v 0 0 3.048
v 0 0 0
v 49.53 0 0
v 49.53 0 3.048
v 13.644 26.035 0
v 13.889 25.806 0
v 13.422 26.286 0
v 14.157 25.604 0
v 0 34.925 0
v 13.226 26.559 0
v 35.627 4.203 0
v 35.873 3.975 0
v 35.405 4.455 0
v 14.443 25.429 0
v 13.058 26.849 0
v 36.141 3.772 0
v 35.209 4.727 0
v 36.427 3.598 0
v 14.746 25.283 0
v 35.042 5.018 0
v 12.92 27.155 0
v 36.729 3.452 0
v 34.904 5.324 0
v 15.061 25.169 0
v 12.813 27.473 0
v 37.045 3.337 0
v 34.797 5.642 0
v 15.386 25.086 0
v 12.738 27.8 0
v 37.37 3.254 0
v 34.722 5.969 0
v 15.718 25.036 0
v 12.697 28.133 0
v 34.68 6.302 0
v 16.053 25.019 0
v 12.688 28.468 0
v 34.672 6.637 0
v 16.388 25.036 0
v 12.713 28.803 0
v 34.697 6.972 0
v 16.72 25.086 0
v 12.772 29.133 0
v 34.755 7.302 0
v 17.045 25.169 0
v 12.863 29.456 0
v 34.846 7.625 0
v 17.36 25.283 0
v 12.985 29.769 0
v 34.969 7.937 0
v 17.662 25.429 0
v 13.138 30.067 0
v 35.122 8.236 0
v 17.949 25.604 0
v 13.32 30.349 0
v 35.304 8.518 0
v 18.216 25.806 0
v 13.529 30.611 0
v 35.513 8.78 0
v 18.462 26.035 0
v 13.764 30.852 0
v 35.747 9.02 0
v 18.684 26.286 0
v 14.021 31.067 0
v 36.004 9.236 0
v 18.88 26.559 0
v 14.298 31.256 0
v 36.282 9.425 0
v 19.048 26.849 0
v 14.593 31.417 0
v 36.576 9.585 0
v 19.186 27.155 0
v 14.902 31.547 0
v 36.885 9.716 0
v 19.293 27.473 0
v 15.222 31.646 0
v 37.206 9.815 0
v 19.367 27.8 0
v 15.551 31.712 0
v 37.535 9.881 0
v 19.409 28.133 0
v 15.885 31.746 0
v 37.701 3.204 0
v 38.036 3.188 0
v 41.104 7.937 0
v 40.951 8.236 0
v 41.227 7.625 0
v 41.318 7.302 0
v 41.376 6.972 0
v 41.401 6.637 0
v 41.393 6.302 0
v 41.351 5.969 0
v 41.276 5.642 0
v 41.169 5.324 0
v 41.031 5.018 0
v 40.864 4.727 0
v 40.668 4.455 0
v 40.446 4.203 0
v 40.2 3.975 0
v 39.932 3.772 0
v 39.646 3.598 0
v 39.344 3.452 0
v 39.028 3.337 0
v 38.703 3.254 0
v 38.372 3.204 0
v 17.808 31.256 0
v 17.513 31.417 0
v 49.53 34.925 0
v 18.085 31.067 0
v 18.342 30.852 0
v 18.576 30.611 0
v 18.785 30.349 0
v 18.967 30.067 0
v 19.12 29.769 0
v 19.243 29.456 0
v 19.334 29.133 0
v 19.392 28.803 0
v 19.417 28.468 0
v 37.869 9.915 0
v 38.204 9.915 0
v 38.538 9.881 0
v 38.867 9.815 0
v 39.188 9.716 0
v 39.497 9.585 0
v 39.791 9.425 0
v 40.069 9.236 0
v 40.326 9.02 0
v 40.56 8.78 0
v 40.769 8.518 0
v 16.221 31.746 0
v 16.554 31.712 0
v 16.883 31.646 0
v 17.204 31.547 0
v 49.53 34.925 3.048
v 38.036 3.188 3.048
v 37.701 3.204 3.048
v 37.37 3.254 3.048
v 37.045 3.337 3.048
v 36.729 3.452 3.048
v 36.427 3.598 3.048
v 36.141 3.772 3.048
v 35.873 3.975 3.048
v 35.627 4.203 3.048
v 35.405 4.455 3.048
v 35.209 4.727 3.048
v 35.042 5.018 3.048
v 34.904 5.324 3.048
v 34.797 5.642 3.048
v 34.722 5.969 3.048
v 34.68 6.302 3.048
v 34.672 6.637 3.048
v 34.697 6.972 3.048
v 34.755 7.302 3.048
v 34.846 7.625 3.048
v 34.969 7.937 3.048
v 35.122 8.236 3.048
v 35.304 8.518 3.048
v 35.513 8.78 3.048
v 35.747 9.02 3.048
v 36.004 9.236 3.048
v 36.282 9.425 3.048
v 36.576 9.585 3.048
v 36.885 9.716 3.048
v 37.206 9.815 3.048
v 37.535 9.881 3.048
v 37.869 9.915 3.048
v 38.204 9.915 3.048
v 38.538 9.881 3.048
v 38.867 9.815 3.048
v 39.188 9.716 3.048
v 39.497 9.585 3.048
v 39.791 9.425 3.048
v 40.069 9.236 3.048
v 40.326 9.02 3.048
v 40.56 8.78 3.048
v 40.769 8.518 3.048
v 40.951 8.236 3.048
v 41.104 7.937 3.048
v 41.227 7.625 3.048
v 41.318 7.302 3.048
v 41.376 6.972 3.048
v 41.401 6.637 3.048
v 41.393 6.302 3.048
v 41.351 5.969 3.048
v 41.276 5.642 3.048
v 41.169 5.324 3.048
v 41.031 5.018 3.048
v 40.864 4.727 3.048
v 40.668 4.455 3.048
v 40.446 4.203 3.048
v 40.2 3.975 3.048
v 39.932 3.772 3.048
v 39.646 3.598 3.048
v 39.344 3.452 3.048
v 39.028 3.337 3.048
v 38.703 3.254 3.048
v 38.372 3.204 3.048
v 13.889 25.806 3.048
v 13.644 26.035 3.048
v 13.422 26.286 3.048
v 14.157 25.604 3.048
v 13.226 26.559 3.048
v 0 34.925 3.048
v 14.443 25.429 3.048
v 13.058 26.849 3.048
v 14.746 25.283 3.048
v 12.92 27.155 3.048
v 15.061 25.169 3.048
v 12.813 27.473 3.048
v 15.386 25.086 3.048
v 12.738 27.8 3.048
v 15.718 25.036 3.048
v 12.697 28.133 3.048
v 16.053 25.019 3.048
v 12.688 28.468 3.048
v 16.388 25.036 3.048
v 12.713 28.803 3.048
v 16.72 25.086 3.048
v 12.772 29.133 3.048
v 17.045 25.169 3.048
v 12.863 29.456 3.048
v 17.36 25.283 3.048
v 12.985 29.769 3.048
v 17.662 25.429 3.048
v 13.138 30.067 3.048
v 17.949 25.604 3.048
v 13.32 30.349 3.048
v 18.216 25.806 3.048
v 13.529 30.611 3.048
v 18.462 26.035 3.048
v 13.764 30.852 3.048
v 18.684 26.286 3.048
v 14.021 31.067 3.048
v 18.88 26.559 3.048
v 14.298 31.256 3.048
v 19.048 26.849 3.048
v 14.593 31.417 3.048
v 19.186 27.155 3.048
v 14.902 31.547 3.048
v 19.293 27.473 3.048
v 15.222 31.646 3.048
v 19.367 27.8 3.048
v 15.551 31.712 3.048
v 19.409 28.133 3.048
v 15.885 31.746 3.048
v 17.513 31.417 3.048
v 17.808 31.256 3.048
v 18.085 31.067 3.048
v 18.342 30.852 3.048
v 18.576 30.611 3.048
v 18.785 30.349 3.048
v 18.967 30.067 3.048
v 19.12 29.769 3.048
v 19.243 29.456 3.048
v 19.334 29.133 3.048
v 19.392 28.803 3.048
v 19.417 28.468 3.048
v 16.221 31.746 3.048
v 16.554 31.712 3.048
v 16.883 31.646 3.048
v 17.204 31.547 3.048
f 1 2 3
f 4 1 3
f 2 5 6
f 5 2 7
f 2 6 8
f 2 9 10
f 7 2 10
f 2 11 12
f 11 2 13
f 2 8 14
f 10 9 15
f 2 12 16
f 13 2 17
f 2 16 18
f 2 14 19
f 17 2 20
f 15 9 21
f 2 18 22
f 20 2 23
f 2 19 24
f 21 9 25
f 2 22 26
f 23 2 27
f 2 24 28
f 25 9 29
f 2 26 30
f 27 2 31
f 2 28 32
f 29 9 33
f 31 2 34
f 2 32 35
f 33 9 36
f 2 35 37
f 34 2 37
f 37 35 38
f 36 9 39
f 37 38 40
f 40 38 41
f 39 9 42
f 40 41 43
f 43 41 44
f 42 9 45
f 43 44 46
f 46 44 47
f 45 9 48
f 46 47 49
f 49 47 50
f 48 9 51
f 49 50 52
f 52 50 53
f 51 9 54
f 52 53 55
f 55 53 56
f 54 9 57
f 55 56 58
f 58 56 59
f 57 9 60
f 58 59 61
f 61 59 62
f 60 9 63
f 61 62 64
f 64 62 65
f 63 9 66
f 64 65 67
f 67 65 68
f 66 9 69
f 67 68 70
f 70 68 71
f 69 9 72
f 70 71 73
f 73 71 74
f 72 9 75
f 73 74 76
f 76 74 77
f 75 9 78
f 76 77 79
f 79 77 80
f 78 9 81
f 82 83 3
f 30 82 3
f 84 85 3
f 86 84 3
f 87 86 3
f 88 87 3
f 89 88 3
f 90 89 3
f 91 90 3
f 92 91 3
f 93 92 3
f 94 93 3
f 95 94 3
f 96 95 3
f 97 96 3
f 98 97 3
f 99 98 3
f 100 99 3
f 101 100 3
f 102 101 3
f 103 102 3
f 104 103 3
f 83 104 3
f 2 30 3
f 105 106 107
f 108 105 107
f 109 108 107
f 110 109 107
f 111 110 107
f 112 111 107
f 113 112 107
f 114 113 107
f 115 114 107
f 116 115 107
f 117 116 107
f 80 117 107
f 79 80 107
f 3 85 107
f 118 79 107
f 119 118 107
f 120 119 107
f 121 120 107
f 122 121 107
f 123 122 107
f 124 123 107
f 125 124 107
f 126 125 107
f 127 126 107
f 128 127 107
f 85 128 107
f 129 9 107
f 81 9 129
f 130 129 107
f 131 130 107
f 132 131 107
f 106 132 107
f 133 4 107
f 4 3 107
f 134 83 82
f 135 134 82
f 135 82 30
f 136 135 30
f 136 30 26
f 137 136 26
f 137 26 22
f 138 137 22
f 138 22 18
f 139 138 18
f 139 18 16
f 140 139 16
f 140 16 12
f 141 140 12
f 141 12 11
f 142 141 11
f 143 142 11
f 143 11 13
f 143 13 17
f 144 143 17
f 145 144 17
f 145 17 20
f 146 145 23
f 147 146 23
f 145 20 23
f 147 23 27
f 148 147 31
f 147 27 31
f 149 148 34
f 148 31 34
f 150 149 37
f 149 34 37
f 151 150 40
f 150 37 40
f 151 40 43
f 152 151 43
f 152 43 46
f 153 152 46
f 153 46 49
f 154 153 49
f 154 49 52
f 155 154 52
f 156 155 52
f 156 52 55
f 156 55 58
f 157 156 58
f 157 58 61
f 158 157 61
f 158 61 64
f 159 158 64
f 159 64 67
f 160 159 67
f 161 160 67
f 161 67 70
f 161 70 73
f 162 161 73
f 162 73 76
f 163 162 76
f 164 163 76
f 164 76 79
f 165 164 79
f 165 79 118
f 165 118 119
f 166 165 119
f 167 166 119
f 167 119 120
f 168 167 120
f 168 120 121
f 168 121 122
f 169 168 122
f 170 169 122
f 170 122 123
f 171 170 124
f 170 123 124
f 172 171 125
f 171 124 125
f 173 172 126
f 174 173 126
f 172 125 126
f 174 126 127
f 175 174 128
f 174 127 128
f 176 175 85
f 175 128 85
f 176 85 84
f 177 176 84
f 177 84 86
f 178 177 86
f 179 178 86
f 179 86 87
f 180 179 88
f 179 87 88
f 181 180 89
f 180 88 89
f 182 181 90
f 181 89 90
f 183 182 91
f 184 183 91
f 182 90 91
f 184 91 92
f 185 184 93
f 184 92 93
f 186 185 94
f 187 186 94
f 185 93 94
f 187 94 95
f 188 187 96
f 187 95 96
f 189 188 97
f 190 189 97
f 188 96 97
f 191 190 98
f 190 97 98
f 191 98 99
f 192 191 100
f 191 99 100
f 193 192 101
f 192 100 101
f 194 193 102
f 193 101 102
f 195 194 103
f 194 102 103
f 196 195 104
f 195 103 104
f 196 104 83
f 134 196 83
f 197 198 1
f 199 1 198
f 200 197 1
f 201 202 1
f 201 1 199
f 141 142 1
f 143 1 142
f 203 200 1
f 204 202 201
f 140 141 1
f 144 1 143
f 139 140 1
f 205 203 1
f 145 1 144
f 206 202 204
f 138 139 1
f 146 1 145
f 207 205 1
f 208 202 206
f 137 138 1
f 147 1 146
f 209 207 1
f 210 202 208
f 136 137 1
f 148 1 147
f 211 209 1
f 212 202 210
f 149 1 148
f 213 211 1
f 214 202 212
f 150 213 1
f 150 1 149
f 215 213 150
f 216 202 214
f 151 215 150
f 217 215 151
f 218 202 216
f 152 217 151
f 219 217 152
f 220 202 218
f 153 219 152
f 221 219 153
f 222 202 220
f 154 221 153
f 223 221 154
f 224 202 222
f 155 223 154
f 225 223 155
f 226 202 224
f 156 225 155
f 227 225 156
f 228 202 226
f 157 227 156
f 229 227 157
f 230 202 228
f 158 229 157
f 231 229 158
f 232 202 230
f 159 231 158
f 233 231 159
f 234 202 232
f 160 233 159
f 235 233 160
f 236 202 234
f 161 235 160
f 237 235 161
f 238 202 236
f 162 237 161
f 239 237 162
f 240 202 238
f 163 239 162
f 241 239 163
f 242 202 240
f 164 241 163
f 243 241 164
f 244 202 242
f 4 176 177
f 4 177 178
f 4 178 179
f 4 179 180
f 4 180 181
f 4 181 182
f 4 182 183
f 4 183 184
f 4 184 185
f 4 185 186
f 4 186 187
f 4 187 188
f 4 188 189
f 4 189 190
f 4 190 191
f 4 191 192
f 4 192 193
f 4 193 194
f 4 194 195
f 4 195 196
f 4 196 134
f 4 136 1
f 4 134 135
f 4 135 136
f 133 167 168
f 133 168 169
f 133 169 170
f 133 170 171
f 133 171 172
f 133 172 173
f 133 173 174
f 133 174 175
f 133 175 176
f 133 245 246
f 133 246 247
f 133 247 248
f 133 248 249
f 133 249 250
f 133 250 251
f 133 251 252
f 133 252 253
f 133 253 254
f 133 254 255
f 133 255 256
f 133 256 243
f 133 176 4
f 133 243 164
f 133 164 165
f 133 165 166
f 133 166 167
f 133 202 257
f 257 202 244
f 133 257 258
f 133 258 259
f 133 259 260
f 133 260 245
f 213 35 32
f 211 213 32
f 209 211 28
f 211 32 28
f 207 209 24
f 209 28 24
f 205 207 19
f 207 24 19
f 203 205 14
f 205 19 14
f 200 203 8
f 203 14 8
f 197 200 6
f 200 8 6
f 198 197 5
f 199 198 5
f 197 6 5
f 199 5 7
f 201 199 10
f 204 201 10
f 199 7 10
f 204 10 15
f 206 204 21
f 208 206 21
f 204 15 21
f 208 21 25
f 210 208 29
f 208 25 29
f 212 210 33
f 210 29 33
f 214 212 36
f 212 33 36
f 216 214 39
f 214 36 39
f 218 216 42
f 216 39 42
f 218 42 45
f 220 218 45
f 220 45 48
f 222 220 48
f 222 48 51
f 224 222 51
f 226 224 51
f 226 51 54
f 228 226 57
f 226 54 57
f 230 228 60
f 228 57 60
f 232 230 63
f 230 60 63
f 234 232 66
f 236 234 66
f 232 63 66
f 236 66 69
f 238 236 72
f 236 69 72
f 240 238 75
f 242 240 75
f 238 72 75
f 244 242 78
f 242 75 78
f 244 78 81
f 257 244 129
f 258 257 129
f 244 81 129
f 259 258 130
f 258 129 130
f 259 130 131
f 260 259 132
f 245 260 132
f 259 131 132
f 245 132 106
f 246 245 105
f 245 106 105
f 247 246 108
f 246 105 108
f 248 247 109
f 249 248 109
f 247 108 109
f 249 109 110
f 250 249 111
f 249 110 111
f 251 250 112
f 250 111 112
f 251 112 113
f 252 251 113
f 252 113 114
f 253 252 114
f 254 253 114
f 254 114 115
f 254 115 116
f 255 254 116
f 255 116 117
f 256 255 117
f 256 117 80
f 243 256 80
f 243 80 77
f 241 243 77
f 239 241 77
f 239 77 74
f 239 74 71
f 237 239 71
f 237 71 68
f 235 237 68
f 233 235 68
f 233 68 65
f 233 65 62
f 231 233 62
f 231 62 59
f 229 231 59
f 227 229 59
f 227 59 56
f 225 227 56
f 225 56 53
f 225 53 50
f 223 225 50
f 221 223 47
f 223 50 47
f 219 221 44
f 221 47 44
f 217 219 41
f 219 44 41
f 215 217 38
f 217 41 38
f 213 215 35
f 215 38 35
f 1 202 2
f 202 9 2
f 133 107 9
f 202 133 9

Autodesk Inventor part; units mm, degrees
ref_plane "YZ Plane" through (0, 0, 0) normal (1, 0, 0) x (0, 1, 0)
ref_plane "XZ Plane" through (0, 0, 0) normal (0, 1, 0) x (-1, 0, 0)
ref_plane "XY Plane" through (0, 0, 0) normal (0, 0, 1) x (1, 0, 0)
sketch "Sketch1" plane through (0, 0, 0) normal (0, 0, 1) x (1, 0, 0)
  line L0 (0, 0) -> (49.53, 0)
  line L1 (49.53, 0) -> (49.53, 34.925)
  line L2 (49.53, 34.925) -> (0, 34.925)
  line L3 (0, 34.925) -> (0, 0)
  dimension "d0" = 49.53
  dimension "d1" = 34.925
extrude "Plate1" add sketch "Sketch1" along normal blind 3.048
hole "Hole1" at (38.0365, 6.5532, 3.048) direction (0, 0, -1) diameter 6.731 end through all
hole "Hole2" at (16.0528, 28.3845, 3.048) direction (0, 0, -1) diameter 6.731 end through all
equation "\"d10\" = Thickness"
equation "\"d20\" = Thickness"
equation "\"BendRadius\" = Thickness"
equation "\"BendReliefWidth\" = Thickness"
equation "\"BendReliefDepth\" = 0.5 * Thickness"
equation "\"CornerReliefSize\" = 4 * Thickness"
equation "\"MinimumRemnant\" = 2 * Thickness"
equation "\"TransitionRadius\" = BendRadius"
equation "\"JacobiRadiusSize\" = BendRadius"
equation "\"GapSize\" = Thickness"
equation "\"d2\" = BendRadius"
equation "\"Thickness\" = 3.048"
properties part number "Claw - Arm - Plate 2"
